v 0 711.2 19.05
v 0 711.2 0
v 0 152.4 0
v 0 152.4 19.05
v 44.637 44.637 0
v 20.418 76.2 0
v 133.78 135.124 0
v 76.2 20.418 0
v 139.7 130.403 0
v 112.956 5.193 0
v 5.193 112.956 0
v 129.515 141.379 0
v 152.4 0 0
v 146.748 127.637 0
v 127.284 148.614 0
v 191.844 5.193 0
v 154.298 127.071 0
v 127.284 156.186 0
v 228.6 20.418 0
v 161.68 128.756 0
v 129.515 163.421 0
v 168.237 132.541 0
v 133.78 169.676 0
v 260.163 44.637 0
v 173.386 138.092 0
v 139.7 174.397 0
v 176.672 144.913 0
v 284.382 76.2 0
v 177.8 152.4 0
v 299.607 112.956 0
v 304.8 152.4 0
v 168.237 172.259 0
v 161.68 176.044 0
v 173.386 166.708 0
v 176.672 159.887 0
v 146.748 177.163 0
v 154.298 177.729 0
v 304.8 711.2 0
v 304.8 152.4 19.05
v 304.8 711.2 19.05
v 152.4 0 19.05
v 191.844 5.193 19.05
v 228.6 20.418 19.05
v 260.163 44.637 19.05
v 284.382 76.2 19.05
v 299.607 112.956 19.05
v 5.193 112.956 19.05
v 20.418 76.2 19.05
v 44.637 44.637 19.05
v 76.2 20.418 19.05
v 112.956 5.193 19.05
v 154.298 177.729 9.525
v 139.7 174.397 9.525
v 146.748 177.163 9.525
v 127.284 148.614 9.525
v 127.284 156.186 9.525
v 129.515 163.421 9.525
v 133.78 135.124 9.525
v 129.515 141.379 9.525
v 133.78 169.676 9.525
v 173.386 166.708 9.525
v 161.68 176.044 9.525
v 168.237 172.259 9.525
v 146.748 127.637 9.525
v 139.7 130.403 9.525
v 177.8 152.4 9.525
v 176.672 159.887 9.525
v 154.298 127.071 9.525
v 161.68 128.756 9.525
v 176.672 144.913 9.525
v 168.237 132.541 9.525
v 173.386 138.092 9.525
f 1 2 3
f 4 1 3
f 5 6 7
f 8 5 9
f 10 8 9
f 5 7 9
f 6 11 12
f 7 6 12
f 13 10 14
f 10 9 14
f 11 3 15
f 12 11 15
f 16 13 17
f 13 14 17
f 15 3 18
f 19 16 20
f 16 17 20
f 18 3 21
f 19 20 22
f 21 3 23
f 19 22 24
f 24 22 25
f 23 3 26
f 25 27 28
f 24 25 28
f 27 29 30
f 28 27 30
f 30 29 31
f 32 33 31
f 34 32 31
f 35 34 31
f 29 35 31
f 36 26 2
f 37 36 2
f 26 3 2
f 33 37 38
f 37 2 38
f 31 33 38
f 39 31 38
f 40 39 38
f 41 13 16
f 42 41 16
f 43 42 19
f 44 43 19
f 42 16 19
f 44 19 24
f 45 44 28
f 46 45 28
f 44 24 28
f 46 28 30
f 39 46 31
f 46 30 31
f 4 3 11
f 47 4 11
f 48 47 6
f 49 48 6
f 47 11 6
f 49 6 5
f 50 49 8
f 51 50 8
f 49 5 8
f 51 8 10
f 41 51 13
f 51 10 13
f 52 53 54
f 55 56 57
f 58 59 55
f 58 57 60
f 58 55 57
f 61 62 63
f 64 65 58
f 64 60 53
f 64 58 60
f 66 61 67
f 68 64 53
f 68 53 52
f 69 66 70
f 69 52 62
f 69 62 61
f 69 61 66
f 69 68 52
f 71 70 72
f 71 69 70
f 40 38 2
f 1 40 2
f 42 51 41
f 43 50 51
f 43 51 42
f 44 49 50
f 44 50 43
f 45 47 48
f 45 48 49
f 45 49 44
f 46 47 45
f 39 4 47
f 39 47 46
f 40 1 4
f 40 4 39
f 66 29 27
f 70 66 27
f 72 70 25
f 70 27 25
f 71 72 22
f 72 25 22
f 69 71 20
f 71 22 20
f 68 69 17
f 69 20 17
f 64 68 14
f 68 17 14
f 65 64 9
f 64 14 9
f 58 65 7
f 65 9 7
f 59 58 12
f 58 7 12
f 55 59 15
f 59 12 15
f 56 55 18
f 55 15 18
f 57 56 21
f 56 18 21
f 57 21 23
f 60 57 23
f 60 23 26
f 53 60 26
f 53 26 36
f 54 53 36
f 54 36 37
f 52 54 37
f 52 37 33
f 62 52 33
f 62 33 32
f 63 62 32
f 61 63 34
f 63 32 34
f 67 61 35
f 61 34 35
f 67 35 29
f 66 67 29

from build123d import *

# Parameters (mm, degrees)
F1_DEPTH = 19.05
F2_R     = 25.4
F3_DEPTH = 9.525


with BuildPart() as f1:
    # F0 (on Top) → F1 (new body)
    with BuildSketch(Plane.XY):
        with BuildLine():
            Line((0, 711.2), (0, 152.4))
            ThreePointArc((0, 152.4), (44.636927, 44.636927), (152.4, 0))
            ThreePointArc((152.4, 0), (260.163073, 44.636927), (304.8, 152.4))
            Line((304.8, 152.4), (304.8, 711.2))
            Line((304.8, 711.2), (0, 711.2))
        make_face()
    extrude(amount=F1_DEPTH)

    # F2 (on face) → F3 (cut)
    with BuildSketch(Plane(origin=(0, 0, 0), x_dir=(1, 0, 0), z_dir=(0, 0, -1))):
        with Locations((152.4, -152.4)):
            Circle(F2_R)
    extrude(amount=-F3_DEPTH, mode=Mode.SUBTRACT)


solid = f1.part
